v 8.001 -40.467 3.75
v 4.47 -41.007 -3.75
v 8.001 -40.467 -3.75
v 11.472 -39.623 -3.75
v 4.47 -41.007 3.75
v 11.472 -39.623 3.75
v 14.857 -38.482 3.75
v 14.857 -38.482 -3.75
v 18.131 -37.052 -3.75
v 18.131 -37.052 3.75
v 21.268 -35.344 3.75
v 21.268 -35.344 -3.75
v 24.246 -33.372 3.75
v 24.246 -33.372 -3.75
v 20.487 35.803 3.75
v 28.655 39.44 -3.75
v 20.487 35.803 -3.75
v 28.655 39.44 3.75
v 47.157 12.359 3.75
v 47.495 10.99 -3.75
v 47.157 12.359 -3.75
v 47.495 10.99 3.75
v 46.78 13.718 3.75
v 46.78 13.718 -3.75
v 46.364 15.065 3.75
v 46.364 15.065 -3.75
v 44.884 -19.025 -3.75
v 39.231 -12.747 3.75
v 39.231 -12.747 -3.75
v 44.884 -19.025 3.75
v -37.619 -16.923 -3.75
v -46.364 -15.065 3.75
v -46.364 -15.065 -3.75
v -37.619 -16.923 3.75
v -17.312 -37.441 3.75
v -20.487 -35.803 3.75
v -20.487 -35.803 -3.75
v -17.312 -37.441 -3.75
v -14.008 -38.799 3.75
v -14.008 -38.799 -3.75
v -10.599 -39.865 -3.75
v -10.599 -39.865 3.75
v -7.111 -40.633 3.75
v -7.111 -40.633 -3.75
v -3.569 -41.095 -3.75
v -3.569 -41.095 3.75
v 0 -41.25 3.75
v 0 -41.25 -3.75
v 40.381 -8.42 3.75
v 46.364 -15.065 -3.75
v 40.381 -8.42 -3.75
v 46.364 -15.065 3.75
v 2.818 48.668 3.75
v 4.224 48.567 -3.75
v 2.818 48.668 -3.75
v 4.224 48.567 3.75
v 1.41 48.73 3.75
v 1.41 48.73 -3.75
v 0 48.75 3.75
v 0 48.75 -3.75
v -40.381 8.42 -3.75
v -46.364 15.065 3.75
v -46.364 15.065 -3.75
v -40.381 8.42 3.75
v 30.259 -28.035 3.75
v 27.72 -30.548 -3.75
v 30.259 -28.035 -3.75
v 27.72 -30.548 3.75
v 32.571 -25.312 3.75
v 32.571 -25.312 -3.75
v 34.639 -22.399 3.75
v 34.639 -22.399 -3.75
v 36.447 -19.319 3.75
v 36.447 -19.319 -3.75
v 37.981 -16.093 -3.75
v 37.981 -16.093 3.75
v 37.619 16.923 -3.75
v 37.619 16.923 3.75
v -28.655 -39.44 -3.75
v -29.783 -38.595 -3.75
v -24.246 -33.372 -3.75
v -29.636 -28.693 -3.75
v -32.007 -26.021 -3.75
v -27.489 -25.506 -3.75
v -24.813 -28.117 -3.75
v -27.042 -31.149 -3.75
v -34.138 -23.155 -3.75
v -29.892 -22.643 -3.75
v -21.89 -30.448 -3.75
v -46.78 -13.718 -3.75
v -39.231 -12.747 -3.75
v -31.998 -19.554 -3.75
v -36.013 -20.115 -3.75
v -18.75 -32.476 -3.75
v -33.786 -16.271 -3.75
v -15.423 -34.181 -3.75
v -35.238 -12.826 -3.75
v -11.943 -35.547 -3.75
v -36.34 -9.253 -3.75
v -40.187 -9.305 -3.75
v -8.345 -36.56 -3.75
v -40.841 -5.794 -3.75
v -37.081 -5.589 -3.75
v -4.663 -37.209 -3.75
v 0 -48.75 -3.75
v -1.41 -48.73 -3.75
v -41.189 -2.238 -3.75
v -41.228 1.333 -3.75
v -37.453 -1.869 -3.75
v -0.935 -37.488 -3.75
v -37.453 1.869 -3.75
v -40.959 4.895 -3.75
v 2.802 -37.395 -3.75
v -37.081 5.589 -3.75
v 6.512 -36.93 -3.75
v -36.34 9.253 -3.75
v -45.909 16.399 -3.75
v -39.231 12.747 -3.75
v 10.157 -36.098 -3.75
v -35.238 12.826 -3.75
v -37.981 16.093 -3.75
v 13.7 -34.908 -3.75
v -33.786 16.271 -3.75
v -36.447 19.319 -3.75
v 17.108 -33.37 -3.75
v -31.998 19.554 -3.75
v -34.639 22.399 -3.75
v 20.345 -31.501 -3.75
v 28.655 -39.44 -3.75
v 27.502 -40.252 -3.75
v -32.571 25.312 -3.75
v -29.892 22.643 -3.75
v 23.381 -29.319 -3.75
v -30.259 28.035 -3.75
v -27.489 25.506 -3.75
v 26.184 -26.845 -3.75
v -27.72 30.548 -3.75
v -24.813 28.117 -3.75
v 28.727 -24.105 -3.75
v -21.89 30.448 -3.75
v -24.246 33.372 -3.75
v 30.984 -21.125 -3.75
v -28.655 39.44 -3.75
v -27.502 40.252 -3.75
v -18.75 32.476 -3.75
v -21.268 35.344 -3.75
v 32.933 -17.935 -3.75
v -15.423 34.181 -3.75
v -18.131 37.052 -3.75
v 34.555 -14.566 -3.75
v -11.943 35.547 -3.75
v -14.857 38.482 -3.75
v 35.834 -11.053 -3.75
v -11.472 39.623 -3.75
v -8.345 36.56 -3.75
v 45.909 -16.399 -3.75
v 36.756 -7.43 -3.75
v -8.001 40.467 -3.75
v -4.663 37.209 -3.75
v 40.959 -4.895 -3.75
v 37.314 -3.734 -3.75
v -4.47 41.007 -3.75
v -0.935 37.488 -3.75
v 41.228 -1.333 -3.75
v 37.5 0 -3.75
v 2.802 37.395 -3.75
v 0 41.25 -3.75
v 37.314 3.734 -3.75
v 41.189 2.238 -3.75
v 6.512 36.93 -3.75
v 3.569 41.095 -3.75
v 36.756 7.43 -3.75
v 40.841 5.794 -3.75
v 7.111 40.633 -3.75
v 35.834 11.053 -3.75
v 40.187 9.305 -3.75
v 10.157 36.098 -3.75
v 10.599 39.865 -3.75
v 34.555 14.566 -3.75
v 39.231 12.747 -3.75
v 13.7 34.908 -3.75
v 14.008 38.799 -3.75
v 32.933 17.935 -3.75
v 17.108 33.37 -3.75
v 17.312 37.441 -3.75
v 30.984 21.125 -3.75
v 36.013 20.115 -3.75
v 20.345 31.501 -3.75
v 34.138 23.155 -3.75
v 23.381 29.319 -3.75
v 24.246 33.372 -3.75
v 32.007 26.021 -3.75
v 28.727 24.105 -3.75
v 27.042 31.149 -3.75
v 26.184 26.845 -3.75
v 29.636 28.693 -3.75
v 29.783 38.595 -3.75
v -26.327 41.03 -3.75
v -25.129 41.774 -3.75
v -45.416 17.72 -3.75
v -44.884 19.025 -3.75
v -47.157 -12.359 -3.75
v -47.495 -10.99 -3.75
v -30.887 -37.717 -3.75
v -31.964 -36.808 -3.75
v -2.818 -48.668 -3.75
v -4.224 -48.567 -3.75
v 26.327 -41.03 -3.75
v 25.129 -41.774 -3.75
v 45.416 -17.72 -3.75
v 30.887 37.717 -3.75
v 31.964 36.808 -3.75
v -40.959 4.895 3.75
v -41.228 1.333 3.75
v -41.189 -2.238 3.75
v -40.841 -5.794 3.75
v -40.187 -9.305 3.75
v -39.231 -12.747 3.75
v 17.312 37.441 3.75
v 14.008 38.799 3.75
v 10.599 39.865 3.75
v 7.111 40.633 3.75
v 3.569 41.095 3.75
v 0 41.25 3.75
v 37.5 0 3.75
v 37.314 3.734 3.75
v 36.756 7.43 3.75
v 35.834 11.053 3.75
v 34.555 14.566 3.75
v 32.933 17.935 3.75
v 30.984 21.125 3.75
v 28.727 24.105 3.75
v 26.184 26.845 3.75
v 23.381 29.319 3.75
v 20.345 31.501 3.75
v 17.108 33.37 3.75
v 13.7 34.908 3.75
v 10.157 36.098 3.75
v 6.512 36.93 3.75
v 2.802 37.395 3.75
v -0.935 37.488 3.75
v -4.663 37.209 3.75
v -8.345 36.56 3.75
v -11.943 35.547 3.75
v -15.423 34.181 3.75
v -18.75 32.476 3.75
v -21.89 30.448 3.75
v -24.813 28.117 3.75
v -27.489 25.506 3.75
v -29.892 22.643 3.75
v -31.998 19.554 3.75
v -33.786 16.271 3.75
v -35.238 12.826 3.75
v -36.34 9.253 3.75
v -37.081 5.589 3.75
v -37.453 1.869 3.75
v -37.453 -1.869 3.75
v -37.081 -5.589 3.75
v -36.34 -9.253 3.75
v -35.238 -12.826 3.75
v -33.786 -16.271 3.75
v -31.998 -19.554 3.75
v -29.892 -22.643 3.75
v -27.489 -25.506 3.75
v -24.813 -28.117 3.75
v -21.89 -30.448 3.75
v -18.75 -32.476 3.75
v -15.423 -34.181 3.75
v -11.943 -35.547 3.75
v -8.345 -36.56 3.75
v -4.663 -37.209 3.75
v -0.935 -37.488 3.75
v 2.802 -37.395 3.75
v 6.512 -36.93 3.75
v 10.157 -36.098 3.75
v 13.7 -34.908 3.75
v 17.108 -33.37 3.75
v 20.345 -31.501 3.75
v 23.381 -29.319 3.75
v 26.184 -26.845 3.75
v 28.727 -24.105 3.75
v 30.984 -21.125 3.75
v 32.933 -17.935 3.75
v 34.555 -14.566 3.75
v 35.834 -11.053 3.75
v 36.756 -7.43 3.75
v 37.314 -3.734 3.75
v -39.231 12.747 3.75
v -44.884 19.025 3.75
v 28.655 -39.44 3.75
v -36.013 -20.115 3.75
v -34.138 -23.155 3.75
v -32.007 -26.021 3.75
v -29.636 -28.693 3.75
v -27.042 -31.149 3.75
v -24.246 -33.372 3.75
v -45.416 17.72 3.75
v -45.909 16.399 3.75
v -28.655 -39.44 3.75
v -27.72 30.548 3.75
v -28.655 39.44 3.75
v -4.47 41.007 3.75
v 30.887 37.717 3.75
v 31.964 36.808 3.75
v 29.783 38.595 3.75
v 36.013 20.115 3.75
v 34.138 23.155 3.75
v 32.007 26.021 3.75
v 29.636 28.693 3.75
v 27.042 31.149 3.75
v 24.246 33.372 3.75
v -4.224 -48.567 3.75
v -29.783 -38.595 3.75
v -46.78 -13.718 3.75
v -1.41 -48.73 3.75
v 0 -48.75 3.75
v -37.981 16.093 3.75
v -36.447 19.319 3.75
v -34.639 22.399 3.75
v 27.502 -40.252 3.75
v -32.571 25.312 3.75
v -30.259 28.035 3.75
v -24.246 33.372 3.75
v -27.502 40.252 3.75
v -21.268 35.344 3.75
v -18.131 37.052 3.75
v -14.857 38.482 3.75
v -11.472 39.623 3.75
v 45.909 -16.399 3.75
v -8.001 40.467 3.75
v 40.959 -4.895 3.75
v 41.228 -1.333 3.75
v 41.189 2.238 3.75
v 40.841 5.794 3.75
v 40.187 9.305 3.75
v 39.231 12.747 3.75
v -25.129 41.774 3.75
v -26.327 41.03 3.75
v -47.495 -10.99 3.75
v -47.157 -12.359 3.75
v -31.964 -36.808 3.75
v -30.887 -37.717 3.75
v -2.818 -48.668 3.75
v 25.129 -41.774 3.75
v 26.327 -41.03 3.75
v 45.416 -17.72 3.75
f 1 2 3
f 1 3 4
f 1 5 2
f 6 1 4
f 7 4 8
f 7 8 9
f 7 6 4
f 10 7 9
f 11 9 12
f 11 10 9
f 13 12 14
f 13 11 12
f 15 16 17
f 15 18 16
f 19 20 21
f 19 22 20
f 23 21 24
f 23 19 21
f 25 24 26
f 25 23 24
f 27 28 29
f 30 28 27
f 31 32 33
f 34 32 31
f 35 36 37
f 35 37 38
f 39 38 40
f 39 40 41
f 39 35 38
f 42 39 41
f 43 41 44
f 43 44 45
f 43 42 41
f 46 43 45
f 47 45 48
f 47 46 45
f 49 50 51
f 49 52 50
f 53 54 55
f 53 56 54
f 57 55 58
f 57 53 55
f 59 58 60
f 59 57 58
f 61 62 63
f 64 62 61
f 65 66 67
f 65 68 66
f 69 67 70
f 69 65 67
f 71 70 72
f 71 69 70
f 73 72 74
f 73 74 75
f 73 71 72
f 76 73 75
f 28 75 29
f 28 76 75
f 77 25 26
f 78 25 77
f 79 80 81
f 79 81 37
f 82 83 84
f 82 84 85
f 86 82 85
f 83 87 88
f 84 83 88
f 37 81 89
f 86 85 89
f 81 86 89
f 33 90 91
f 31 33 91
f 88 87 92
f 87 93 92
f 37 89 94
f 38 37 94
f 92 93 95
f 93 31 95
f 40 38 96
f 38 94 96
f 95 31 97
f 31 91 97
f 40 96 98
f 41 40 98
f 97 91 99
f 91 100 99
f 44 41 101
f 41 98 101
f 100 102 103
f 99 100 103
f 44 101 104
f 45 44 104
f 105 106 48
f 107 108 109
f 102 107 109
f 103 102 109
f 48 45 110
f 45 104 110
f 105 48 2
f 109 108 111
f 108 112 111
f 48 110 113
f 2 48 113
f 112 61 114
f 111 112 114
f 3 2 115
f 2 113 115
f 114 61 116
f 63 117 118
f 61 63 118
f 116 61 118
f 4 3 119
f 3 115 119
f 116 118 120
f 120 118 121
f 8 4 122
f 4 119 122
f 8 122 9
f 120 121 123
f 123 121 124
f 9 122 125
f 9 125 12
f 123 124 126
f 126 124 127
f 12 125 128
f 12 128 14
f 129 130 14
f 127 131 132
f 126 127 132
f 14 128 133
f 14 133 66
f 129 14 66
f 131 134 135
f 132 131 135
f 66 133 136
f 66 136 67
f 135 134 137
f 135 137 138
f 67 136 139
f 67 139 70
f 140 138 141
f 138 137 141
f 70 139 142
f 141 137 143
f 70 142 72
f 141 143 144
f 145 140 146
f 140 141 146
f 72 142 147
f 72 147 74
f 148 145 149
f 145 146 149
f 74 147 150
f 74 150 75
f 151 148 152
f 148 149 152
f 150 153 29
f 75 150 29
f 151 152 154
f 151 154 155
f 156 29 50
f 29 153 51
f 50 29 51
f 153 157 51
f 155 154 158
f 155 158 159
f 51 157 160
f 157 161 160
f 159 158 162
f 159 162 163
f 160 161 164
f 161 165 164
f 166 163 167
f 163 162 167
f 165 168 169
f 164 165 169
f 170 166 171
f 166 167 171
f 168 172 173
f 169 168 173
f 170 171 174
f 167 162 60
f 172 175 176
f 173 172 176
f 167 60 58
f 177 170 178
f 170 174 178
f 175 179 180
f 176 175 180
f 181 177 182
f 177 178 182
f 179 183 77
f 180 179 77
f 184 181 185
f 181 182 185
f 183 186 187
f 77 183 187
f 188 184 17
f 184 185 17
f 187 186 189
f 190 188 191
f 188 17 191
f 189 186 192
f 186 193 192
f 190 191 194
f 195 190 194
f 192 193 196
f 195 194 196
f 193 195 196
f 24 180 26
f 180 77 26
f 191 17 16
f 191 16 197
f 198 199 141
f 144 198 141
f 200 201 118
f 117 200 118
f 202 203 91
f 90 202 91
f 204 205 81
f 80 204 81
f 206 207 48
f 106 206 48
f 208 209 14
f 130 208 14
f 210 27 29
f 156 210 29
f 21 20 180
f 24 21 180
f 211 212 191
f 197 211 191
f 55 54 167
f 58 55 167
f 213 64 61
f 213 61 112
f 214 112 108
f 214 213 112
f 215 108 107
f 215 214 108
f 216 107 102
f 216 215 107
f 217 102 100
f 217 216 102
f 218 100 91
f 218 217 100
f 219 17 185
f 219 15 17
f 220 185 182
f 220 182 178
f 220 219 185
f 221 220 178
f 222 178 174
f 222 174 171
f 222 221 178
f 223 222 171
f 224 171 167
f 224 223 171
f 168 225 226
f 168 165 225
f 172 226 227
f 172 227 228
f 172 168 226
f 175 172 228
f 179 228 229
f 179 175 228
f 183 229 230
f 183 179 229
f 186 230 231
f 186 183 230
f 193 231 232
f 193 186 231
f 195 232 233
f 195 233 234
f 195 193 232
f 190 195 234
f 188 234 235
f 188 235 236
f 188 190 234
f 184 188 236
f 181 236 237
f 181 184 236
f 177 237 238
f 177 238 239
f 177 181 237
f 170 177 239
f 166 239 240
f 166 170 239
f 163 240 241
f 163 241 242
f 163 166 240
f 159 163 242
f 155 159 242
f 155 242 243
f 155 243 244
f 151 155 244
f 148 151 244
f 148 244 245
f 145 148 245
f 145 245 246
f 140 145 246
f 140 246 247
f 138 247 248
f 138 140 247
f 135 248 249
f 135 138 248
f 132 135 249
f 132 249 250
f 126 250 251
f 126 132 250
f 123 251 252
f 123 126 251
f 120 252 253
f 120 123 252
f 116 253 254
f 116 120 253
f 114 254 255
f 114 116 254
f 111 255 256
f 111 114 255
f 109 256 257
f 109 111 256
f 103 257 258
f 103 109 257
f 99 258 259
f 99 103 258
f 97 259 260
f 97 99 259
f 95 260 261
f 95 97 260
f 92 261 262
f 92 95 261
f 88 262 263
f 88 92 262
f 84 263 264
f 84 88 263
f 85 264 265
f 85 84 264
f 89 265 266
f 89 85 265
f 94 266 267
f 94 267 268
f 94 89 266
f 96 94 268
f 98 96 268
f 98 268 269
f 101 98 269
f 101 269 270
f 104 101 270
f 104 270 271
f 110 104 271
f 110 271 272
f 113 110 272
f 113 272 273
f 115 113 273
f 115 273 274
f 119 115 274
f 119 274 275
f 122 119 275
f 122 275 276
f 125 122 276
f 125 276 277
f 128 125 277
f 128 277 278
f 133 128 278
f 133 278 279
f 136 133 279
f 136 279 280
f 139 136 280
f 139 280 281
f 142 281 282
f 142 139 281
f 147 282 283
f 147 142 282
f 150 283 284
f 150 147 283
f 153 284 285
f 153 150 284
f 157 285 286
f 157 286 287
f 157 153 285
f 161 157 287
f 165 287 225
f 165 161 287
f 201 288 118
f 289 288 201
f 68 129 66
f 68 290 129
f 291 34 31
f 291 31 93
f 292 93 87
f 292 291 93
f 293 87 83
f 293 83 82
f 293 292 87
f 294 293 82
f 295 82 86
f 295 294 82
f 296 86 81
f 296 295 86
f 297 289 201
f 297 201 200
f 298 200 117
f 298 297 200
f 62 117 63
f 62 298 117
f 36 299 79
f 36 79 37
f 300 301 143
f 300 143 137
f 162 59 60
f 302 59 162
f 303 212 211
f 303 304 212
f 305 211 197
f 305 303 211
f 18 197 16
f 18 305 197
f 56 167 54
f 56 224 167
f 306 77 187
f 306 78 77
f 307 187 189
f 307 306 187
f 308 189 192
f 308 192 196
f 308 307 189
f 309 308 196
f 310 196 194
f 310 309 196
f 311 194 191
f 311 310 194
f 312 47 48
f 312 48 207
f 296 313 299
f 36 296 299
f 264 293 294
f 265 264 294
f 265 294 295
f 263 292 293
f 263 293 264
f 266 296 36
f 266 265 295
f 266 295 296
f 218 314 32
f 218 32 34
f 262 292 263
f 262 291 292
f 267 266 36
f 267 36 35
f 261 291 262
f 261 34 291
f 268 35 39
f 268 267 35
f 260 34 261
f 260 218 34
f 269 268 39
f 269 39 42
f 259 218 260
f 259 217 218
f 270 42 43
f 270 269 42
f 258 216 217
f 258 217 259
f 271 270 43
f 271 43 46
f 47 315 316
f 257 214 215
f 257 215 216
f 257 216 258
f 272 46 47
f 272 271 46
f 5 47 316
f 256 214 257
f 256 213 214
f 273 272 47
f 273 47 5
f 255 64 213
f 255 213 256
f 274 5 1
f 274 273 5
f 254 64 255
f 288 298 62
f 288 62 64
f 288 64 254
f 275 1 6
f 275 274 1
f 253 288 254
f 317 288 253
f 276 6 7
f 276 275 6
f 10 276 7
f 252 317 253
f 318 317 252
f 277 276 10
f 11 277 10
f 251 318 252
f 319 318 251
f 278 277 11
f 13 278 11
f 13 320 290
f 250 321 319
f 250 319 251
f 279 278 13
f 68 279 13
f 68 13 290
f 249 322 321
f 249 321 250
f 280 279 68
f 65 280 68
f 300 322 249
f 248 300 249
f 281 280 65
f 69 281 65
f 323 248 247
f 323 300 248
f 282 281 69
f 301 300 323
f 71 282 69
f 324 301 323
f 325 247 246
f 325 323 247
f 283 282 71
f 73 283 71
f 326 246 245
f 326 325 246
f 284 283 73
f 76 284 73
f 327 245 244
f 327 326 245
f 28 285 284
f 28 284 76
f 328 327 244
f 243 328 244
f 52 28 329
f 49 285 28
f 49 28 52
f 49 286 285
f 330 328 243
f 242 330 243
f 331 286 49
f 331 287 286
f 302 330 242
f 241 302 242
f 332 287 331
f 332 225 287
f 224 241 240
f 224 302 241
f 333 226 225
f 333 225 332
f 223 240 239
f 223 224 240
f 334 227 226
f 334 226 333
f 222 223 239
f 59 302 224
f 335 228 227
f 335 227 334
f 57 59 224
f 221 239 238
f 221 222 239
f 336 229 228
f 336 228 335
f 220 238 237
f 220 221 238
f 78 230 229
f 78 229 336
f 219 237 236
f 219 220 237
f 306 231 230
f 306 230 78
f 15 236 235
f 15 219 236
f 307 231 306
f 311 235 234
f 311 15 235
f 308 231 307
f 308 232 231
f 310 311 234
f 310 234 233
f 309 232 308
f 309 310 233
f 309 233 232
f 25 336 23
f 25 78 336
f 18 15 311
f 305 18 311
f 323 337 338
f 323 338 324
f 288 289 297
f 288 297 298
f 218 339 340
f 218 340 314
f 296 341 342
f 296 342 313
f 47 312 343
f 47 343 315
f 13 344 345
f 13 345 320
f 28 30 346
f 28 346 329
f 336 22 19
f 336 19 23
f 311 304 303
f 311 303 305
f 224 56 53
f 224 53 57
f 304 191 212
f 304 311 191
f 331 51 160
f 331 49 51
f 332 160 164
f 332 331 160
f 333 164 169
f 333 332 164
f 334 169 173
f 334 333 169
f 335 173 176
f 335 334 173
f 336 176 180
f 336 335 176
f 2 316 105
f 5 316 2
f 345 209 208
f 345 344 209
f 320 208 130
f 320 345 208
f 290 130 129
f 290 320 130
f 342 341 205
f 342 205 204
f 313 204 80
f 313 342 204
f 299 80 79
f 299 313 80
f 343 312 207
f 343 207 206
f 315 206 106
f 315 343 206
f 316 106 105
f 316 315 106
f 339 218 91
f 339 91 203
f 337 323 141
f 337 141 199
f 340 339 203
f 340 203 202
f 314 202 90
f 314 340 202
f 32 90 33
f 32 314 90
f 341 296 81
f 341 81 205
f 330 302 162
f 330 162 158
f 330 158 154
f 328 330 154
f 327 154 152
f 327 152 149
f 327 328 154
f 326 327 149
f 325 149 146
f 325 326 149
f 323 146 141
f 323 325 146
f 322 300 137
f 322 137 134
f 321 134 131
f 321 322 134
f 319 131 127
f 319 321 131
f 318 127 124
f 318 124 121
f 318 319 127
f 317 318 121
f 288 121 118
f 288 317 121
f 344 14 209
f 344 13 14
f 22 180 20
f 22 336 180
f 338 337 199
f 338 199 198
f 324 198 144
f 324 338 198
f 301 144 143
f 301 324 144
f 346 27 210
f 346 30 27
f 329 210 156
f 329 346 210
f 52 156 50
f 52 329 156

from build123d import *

# Parameters (mm, degrees)
SKETCH1_R           = 25
BOSS_EXTRUDE1_DEPTH = 2.5
SCALE1_SCALE        = 1.5


with BuildPart() as part:
    # Sketch1 → Boss-Extrude1 (new, symmetric)
    with BuildSketch(Plane.XY):
        with BuildLine():
            Line((0, 32.5), (-2.980263218, 27.338032686))
            ThreePointArc((-2.980263218, 27.338032686), (-9.904736181, 25.654360276), (-16.164094438, 22.247967345))
            Line((-16.164094438, 22.247967345), (-16.75283521, 27.849461618))
            ThreePointArc((-16.75283521, 27.849461618), (-17.944809925, 27.096748823), (-19.1030207, 26.293052317))
            Line((-19.1030207, 26.293052317), (-18.479976031, 20.365178268))
            ThreePointArc((-18.479976031, 20.365178268), (-23.092354522, 14.932955588), (-26.154054198, 8.497967345))
            Line((-26.154054198, 8.497967345), (-29.922831212, 12.683618263))
            ThreePointArc((-29.922831212, 12.683618263), (-30.444725533, 11.374035661), (-30.90933678, 10.043052317))
            Line((-30.90933678, 10.043052317), (-26.920966111, 5.613517939))
            ThreePointArc((-26.920966111, 5.613517939), (-27.459478317, -1.492330582), (-26.154054198, -8.497967345))
            Line((-26.154054198, -8.497967345), (-31.663322731, -7.326936169))
            ThreePointArc((-31.663322731, -7.326936169), (-31.315790766, -8.693172534), (-30.90933678, -10.043052317))
            Line((-30.90933678, -10.043052317), (-25.079062147, -11.282315447))
            ThreePointArc((-25.079062147, -11.282315447), (-21.338014708, -17.347597192), (-16.164094438, -22.247967345))
            Line((-16.164094438, -22.247967345), (-21.309501164, -24.538850017))
            ThreePointArc((-21.309501164, -24.538850017), (-20.225288311, -25.439884291), (-19.1030207, -26.293052317))
            Line((-19.1030207, -26.293052317), (-13.657808848, -23.868687803))
            ThreePointArc((-13.657808848, -23.868687803), (-7.066154732, -26.576671298), (0, -27.5))
            Line((0, -27.5), (-2.816174435, -32.377757204))
            ThreePointArc((-2.816174435, -32.377757204), (-1.409413153, -32.469424919), (0, -32.5))
            Line((0, -32.5), (2.980263218, -27.338032686))
            ThreePointArc((2.980263218, -27.338032686), (9.904736181, -25.654360276), (16.164094438, -22.247967345))
            Line((16.164094438, -22.247967345), (16.75283521, -27.849461618))
            ThreePointArc((16.75283521, -27.849461618), (17.944809925, -27.096748823), (19.1030207, -26.293052317))
            Line((19.1030207, -26.293052317), (18.479976031, -20.365178268))
            ThreePointArc((18.479976031, -20.365178268), (23.092354522, -14.932955588), (26.154054198, -8.497967345))
            Line((26.154054198, -8.497967345), (29.922831212, -12.683618263))
            ThreePointArc((29.922831212, -12.683618263), (30.444725533, -11.374035661), (30.90933678, -10.043052317))
            Line((30.90933678, -10.043052317), (26.920966111, -5.613517939))
            ThreePointArc((26.920966111, -5.613517939), (27.459478317, 1.492330582), (26.154054198, 8.497967345))
            Line((26.154054198, 8.497967345), (31.663322731, 7.326936169))
            ThreePointArc((31.663322731, 7.326936169), (31.315790766, 8.693172534), (30.90933678, 10.043052317))
            Line((30.90933678, 10.043052317), (25.079062147, 11.282315447))
            ThreePointArc((25.079062147, 11.282315447), (21.338014708, 17.347597192), (16.164094438, 22.247967345))
            Line((16.164094438, 22.247967345), (21.309501164, 24.538850017))
            ThreePointArc((21.309501164, 24.538850017), (20.225288311, 25.439884291), (19.1030207, 26.293052317))
            Line((19.1030207, 26.293052317), (13.657808848, 23.868687803))
            ThreePointArc((13.657808848, 23.868687803), (7.066154732, 26.576671298), (0, 27.5))
            Line((0, 27.5), (2.816174435, 32.377757204))
            ThreePointArc((2.816174435, 32.377757204), (1.409413153, 32.469424919), (0, 32.5))
        make_face()
        Circle(SKETCH1_R, mode=Mode.SUBTRACT)
    extrude(amount=BOSS_EXTRUDE1_DEPTH, both=True)


with BuildPart() as part_1:
    # Scale1: scaled about (0, 0, 0)
    add(part.part.scale(SCALE1_SCALE))


solid = part_1.part
